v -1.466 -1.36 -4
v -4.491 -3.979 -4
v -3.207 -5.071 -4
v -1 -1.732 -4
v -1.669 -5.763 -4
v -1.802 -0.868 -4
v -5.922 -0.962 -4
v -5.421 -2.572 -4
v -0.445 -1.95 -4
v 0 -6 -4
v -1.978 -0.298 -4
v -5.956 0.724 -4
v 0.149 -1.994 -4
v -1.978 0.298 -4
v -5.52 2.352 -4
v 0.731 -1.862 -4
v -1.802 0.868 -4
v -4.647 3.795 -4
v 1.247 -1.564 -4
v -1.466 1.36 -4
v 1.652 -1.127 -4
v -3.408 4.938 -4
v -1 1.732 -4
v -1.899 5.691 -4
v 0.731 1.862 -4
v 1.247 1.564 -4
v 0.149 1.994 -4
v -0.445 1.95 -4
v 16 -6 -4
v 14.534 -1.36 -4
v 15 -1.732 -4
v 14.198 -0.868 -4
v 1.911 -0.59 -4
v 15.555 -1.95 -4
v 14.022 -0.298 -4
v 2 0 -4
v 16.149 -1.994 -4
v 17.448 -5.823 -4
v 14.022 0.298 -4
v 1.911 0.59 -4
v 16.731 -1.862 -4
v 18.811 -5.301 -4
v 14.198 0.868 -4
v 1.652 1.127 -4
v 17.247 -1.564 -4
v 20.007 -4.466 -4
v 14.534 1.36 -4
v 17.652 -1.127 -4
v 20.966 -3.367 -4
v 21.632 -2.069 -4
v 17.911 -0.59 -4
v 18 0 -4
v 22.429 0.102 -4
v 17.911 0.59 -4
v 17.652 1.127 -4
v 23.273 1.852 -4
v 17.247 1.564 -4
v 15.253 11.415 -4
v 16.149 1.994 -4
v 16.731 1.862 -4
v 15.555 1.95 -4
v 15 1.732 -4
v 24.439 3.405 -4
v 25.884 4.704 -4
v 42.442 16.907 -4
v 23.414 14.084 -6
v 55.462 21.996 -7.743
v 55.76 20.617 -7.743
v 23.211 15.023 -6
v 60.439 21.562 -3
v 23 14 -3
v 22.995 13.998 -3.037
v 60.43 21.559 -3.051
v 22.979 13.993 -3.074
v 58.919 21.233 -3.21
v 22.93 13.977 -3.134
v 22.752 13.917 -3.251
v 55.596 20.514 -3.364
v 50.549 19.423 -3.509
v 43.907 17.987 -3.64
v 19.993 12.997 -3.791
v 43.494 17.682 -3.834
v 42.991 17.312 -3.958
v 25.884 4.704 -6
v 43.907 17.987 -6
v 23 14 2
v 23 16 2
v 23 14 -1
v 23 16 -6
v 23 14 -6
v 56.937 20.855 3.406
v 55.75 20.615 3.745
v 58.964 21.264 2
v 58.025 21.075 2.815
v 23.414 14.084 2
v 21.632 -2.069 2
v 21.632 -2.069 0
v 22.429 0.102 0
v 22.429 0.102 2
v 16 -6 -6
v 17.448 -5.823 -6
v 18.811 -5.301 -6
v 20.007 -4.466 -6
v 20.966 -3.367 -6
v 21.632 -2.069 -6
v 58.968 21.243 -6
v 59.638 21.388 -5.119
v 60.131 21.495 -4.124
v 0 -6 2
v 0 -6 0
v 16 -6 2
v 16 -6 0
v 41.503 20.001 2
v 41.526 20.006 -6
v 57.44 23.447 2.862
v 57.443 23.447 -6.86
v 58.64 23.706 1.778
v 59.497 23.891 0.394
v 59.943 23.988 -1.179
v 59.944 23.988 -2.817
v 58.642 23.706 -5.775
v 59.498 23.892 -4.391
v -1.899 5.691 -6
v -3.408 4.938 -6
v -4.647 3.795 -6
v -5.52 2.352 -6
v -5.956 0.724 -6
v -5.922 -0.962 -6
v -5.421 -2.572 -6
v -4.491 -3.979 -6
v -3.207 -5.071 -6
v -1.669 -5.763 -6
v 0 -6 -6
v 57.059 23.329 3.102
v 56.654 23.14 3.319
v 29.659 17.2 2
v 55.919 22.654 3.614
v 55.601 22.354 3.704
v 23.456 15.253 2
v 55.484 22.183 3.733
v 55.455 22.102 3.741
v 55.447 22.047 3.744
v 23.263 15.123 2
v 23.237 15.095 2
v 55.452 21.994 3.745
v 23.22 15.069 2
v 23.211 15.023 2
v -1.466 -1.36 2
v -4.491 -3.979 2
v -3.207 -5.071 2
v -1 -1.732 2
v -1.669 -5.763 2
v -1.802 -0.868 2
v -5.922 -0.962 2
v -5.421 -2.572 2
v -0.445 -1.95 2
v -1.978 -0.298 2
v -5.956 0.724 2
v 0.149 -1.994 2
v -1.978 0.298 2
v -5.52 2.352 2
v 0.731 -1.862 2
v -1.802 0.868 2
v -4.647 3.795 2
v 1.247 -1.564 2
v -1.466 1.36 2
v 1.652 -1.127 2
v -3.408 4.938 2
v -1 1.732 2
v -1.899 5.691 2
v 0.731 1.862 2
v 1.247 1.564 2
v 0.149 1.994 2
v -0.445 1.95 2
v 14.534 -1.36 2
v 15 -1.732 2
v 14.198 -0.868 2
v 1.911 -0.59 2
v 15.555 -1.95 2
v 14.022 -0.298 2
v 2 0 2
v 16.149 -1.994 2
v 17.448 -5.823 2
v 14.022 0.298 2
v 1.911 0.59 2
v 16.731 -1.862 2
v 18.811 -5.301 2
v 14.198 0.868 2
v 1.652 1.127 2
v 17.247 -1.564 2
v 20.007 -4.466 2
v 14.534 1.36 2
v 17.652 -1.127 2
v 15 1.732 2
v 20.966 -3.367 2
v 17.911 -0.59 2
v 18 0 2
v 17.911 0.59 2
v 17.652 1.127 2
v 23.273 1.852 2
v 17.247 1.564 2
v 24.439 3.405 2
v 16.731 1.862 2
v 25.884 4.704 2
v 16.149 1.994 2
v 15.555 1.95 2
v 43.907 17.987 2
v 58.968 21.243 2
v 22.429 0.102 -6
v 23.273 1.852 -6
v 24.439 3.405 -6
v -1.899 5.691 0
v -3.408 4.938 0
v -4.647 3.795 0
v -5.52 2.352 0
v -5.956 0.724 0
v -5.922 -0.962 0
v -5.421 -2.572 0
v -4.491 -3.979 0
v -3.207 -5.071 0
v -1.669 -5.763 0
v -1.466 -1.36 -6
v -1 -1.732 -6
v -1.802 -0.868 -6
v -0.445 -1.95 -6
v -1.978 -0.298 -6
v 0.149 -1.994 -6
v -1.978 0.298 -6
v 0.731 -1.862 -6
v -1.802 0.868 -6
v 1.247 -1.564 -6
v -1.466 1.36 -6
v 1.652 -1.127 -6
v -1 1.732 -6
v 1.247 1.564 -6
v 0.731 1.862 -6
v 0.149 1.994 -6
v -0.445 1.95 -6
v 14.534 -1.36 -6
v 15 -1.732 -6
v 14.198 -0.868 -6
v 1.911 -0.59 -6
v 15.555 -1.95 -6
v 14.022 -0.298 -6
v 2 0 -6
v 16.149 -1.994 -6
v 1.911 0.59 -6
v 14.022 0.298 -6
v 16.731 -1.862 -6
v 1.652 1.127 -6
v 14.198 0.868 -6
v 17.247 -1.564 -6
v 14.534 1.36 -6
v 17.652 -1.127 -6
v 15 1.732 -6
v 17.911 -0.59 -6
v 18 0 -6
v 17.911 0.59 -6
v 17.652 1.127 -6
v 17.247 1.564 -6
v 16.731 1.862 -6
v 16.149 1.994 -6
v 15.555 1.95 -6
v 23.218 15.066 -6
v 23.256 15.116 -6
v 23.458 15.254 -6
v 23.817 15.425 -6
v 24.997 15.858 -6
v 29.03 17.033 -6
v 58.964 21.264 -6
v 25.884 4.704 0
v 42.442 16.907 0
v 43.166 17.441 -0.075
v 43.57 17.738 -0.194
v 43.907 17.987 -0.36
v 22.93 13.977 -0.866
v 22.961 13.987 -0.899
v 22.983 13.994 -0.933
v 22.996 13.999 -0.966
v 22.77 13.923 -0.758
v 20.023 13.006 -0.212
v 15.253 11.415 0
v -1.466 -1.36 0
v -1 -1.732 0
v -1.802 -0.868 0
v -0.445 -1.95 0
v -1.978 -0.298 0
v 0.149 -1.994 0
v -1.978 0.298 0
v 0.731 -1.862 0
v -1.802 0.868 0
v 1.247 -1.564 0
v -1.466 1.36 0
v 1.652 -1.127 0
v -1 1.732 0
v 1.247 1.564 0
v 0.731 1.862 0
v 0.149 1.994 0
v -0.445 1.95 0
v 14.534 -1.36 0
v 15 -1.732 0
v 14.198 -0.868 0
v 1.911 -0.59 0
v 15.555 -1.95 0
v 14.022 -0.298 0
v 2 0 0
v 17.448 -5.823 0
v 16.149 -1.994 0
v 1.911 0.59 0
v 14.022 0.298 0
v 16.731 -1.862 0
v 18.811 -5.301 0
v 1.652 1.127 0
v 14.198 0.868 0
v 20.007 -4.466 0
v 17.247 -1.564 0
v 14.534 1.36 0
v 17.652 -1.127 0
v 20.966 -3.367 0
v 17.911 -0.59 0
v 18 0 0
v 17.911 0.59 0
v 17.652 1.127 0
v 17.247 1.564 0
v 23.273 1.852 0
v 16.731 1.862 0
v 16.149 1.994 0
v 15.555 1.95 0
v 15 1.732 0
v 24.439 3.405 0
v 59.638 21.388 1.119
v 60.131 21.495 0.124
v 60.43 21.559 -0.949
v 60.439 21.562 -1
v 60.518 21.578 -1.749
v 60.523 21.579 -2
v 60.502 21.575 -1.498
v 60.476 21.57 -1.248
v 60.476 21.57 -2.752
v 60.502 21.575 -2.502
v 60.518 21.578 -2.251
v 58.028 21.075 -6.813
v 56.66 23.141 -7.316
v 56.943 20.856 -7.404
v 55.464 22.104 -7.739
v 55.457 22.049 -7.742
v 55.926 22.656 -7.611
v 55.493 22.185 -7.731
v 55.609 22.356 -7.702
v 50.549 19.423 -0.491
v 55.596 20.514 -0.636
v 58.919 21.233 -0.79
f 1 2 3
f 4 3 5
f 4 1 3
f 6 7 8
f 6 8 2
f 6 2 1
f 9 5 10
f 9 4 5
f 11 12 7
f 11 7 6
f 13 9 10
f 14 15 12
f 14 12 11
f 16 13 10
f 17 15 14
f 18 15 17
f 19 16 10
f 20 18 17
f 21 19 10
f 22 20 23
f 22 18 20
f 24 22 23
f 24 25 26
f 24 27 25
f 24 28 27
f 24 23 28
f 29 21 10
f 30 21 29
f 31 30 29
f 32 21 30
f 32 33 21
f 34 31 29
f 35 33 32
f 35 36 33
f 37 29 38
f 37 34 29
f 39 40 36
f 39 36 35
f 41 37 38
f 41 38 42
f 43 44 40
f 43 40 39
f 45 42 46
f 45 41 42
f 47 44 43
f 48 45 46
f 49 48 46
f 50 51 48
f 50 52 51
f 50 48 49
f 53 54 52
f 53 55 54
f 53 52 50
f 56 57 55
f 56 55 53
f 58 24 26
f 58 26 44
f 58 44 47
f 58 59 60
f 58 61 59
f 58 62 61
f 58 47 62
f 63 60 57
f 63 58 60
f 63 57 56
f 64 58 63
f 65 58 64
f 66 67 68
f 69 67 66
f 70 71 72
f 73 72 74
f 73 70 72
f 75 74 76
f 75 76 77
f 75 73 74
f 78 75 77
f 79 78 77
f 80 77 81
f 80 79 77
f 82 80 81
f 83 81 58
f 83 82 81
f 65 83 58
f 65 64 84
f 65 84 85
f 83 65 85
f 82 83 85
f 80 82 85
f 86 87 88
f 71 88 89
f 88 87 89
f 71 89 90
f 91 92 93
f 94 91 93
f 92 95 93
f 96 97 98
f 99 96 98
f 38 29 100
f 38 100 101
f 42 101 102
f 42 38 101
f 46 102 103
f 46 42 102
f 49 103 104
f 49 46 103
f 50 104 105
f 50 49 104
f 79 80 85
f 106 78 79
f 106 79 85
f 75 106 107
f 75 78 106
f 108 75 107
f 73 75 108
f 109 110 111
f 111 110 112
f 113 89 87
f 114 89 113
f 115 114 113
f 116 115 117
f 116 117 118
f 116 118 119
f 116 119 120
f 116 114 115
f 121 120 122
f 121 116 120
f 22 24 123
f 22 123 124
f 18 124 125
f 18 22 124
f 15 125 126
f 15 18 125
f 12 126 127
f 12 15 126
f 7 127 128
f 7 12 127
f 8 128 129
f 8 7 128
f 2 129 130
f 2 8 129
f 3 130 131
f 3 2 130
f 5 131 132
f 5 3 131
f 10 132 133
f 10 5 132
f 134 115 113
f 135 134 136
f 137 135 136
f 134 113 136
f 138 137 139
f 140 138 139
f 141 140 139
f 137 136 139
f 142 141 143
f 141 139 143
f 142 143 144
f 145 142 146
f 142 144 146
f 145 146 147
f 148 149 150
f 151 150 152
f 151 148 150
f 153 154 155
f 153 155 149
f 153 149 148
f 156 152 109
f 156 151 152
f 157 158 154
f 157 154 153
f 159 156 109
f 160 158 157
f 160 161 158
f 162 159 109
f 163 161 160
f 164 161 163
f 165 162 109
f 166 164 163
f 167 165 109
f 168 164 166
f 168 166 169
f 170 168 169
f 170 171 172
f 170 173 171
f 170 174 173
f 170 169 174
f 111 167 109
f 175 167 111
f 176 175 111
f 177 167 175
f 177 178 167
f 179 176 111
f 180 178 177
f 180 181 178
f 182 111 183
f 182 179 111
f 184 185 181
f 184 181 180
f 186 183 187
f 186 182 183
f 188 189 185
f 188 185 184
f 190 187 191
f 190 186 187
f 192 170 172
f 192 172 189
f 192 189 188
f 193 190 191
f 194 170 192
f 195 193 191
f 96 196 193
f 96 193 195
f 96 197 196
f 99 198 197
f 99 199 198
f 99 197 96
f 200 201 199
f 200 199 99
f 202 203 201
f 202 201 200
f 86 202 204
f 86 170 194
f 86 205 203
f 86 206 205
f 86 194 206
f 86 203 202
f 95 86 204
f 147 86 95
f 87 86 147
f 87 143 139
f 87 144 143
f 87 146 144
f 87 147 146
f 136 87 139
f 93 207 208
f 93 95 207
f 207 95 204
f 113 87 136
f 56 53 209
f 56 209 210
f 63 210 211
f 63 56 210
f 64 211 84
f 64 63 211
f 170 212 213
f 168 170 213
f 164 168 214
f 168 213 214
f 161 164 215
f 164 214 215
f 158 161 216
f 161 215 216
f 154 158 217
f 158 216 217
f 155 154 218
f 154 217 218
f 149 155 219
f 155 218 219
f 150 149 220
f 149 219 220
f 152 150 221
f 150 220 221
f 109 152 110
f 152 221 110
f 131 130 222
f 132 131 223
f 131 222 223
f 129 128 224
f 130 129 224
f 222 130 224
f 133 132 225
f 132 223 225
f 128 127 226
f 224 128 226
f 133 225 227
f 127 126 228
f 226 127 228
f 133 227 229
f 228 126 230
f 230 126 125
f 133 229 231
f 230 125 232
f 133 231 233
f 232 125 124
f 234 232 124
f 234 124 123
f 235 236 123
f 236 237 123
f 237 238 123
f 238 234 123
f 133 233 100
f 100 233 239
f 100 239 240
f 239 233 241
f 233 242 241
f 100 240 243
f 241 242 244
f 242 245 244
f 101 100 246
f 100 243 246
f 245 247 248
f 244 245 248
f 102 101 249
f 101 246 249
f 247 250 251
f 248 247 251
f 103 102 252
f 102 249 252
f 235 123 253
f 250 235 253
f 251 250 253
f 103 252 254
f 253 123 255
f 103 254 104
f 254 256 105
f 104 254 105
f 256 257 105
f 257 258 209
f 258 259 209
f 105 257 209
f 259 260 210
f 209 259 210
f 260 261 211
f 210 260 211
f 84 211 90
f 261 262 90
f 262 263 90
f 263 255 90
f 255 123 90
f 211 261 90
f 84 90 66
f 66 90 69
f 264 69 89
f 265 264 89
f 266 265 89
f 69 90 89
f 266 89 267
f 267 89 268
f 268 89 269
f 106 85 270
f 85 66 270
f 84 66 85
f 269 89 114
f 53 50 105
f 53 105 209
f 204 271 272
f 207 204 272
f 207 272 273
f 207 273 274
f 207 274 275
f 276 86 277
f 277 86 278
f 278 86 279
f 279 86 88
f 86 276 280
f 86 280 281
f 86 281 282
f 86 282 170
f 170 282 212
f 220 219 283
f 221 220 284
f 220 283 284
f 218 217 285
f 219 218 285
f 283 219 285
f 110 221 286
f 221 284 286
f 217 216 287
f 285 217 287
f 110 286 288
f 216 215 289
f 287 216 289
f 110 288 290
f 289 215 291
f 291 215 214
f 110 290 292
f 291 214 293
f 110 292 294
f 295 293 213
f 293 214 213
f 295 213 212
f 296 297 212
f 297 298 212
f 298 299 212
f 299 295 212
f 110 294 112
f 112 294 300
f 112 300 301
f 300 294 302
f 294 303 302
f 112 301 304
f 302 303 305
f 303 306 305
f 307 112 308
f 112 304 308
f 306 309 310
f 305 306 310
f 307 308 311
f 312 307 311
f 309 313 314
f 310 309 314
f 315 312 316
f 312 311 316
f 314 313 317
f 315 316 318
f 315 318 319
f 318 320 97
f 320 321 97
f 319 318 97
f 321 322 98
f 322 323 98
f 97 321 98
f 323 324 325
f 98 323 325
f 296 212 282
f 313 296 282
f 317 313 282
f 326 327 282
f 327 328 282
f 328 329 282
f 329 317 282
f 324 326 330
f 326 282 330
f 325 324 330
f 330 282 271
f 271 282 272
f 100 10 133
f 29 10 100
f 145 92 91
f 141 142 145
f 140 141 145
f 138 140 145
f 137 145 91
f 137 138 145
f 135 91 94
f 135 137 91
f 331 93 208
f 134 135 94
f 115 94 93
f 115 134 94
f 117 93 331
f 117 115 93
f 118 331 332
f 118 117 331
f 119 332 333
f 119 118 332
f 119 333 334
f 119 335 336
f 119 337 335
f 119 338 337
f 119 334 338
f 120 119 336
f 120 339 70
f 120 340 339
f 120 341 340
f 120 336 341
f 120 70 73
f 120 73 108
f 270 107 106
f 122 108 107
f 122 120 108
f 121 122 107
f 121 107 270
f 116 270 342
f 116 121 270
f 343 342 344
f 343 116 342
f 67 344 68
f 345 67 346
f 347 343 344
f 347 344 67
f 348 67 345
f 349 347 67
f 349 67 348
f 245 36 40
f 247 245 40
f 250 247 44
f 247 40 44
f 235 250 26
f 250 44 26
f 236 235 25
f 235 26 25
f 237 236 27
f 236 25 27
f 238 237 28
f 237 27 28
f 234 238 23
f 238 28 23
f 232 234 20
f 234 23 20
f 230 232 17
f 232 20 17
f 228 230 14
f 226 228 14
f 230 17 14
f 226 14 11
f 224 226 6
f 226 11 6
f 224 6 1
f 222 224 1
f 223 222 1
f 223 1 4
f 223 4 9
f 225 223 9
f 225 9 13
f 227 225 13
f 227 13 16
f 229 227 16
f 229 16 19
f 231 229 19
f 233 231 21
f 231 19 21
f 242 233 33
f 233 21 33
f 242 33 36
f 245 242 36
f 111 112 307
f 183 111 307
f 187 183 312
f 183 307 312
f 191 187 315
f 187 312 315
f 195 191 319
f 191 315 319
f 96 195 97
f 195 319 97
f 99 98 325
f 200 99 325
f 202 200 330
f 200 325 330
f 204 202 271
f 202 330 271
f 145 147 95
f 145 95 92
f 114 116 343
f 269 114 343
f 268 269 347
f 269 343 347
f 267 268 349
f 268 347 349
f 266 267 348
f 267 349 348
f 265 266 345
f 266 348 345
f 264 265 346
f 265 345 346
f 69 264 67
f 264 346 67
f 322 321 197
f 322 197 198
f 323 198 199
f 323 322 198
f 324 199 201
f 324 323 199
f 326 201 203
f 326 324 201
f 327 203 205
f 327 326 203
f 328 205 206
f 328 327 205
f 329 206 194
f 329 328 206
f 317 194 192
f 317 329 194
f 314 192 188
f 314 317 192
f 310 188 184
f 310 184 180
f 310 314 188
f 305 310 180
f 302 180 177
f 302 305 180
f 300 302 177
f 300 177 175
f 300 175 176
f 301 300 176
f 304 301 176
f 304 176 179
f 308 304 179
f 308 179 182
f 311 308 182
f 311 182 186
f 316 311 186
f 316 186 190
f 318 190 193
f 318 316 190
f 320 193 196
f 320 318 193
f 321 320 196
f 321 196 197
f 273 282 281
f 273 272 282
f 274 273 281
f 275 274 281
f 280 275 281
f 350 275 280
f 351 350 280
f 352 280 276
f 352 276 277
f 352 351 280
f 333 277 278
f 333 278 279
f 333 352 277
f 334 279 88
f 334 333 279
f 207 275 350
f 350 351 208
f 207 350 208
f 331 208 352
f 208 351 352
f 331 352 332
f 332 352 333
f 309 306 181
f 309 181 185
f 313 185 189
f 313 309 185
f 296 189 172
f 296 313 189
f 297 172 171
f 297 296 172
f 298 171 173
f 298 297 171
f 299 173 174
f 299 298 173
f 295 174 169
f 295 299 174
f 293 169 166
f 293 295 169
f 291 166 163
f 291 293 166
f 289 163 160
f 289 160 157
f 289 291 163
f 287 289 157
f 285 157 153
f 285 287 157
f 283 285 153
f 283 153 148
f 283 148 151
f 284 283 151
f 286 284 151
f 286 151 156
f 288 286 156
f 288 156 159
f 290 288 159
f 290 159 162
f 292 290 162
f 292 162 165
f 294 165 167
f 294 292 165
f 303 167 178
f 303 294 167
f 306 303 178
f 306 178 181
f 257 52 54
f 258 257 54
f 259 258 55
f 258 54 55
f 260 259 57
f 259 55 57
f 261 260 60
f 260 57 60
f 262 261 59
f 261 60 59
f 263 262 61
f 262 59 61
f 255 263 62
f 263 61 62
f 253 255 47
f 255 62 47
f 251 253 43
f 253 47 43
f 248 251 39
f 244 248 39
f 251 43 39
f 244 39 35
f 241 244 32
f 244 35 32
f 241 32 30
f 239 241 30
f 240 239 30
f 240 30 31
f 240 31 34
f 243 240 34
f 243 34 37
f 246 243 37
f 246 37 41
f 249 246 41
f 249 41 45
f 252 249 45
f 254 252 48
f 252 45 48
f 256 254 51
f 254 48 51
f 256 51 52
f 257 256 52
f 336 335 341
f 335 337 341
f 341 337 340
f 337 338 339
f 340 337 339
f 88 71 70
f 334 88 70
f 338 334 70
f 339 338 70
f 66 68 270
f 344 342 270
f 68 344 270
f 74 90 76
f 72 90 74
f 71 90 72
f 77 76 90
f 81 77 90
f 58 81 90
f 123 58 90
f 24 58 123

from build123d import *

# Parameters (mm, degrees)
ESQUISSE1_R             = 2
BOSS_EXTRU_1_DEPTH      = 2
BOSS_EXTRU_2_DEPTH      = 2
BOSS_EXTRU_3_REACH      = 67.218
ENL_V_MAT_EXTRU_5_DEPTH = 66.43216575
CONG_1_R                = 1
CONG_2_R                = 1


with BuildPart() as part:
    # Esquisse1 → Boss.-Extru.1 (new body)
    with BuildSketch(Plane.XY):
        with BuildLine():
            Line((0, -6), (16, -6))
            ThreePointArc((16, -6), (19.434160723, -4.920014241), (21.632039887, -2.06884671))
            Line((21.632039887, -2.06884671), (22.429477002, 0.102023476))
            ThreePointArc((22.429477002, 0.102023476), (23.818382286, 2.656840718), (25.883595813, 4.704044206))
            Line((25.883595813, 4.704044206), (43.907312567, 17.986833146))
            Line((43.907312567, 17.986833146), (60.52335338, 21.579490619))
            Line((60.52335338, 21.579490619), (60, 24))
            Line((60, 24), (23, 16))
            Line((23, 16), (23, 14))
            Line((23, 14), (-1.899172411, 5.691497532))
            ThreePointArc((-1.899172411, 5.691497532), (-5.92237221, -0.962032954), (0, -6))
        make_face()
        Circle(ESQUISSE1_R, mode=Mode.SUBTRACT)
        with Locations((16, 0)):
            Circle(ESQUISSE1_R, mode=Mode.SUBTRACT)
    boss_extru_1 = extrude(amount=BOSS_EXTRU_1_DEPTH)

    # Esquisse2 → Boss.-Extru.2 (add)
    with BuildSketch(Plane(origin=(0, 0, 0), x_dir=(-1, 0, 0), z_dir=(0, 0, -1))):
        Polygon((-60.52335338, 21.579490619), (-60, 24), (-23, 16), (-23, 14), align=None)
    boss_extru_2 = extrude(amount=BOSS_EXTRU_2_DEPTH)

    # Symétrie1: Boss.-Extru.1, Boss.-Extru.2 across plane
    add(boss_extru_1.mirror(Plane.XY.offset(-2)))
    add(boss_extru_2.mirror(Plane.XY.offset(-2)))

    # Boss.-Extru.3: up to this plane
    boss_extru_3_end = Plane(origin=(23, 14, -2), z_dir=(-0.19799508496371696, 0.9802030128142897, 0))
    # Esquisse7 → Boss.-Extru.3 (add, up to the surface)
    with BuildSketch(Plane(origin=(-2.277739009, 10.534542917, 0), x_dir=(0.9774141654398673, 0.21133279252753906, 0), z_dir=(-0.21133279252753906, 0.9774141654398673, 0)), mode=Mode.PRIVATE) as boss_extru_3_sk1:
        Polygon((25.861850486, -2), (63.667267202, -3.999795233), (63.716836947, 2), (63.716836947, 8), (25.861850486, 6), align=None)
    boss_extru_3_tool1 = split(extrude(boss_extru_3_sk1.sketch, amount=-BOSS_EXTRU_3_REACH, mode=Mode.PRIVATE), bisect_by=boss_extru_3_end, keep=Keep.BOTH, mode=Mode.PRIVATE)
    add(boss_extru_3_tool1.solids().sort_by_distance((42.727149, 20.265329, -2.000928))[0])

    # Esquisse8 → Enlèv. mat.-Extru.5 (cut, through all)
    with BuildSketch(Plane(origin=(-2.277739009, 10.534542917, 0), x_dir=(0.9774141654398673, 0.21133279252753906, 0), z_dir=(-0.21133279252753906, 0.9774141654398673, 0))):
        with BuildLine():
            Line((57.893179092, 7.823657855), (58.153804594, 10.152084359))
            Line((58.153804594, 10.152084359), (67.029835538, 10.152084359))
            Line((67.029835538, 10.152084359), (67.337455885, -6.822766653))
            Line((67.337455885, -6.822766653), (57.261437216, -6.223219))
            Line((57.261437216, -6.223219), (57.893179092, -3.823657855))
            ThreePointArc((57.893179092, -3.823657855), (63.716836947, 2), (57.893179092, 7.823657855))
        make_face()
    extrude(amount=-ENL_V_MAT_EXTRU_5_DEPTH, mode=Mode.SUBTRACT)

    # Congé1
    cong_1_edges = [part.edges().sort_by_distance(p)[0] for p in [
        (41.588067586, 17.75467732, -4),
        (41.588067586, 17.75467732, 0),
    ]]
    fillet(cong_1_edges, radius=CONG_1_R)

    # Congé2
    # the kernel refuses this fillet: 1 mm, written as the material it takes off along each edge
    with BuildSketch(Plane(origin=(57.690537844, 23.500656831, -7.875164208), x_dir=(0.21133279252753906, -0.9774141654398673, 0), z_dir=(-0.9760528637131802, -0.21103845701906618, 0.05275961425476653))) as cong_2_piece_1_section:
        with BuildLine():
            CenterArc((CONG_2_R, CONG_2_R), CONG_2_R, 180, 90)
            Line((0, CONG_2_R), (0, 0))
            Line((0, 0), (CONG_2_R, 0))
        make_face()
    cong_2_piece_1 = extrude(amount=38.041658791, mode=Mode.PRIVATE)
    cong_2_piece_1 = split(cong_2_piece_1, bisect_by=Plane(origin=(54.069822656, 22.51805355, -6), z_dir=(0, 0, -1)), keep=Keep.TOP, mode=Mode.PRIVATE)
    add(cong_2_piece_1, mode=Mode.SUBTRACT)
    with BuildSketch(Plane(origin=(20.559876055, 15.472405634, 1.867941987), x_dir=(0.2113327925275391, -0.9774141654398673, 0), z_dir=(0.9760495779057013, 0.2110377465742059, 0.05282320504270329))) as cong_2_piece_2_section:
        with BuildLine():
            CenterArc((CONG_2_R, CONG_2_R), CONG_2_R, 180, 90)
            Line((0, CONG_2_R), (0, 0))
            Line((0, 0), (CONG_2_R, 0))
        make_face()
    cong_2_piece_2 = extrude(amount=38.032176769, mode=Mode.PRIVATE)
    cong_2_piece_2 = split(cong_2_piece_2, bisect_by=Plane(origin=(39.441724265, 19.308611578, 2), z_dir=(0, 0, 1)), keep=Keep.TOP, mode=Mode.PRIVATE)
    add(cong_2_piece_2, mode=Mode.SUBTRACT)


solid = part.part
